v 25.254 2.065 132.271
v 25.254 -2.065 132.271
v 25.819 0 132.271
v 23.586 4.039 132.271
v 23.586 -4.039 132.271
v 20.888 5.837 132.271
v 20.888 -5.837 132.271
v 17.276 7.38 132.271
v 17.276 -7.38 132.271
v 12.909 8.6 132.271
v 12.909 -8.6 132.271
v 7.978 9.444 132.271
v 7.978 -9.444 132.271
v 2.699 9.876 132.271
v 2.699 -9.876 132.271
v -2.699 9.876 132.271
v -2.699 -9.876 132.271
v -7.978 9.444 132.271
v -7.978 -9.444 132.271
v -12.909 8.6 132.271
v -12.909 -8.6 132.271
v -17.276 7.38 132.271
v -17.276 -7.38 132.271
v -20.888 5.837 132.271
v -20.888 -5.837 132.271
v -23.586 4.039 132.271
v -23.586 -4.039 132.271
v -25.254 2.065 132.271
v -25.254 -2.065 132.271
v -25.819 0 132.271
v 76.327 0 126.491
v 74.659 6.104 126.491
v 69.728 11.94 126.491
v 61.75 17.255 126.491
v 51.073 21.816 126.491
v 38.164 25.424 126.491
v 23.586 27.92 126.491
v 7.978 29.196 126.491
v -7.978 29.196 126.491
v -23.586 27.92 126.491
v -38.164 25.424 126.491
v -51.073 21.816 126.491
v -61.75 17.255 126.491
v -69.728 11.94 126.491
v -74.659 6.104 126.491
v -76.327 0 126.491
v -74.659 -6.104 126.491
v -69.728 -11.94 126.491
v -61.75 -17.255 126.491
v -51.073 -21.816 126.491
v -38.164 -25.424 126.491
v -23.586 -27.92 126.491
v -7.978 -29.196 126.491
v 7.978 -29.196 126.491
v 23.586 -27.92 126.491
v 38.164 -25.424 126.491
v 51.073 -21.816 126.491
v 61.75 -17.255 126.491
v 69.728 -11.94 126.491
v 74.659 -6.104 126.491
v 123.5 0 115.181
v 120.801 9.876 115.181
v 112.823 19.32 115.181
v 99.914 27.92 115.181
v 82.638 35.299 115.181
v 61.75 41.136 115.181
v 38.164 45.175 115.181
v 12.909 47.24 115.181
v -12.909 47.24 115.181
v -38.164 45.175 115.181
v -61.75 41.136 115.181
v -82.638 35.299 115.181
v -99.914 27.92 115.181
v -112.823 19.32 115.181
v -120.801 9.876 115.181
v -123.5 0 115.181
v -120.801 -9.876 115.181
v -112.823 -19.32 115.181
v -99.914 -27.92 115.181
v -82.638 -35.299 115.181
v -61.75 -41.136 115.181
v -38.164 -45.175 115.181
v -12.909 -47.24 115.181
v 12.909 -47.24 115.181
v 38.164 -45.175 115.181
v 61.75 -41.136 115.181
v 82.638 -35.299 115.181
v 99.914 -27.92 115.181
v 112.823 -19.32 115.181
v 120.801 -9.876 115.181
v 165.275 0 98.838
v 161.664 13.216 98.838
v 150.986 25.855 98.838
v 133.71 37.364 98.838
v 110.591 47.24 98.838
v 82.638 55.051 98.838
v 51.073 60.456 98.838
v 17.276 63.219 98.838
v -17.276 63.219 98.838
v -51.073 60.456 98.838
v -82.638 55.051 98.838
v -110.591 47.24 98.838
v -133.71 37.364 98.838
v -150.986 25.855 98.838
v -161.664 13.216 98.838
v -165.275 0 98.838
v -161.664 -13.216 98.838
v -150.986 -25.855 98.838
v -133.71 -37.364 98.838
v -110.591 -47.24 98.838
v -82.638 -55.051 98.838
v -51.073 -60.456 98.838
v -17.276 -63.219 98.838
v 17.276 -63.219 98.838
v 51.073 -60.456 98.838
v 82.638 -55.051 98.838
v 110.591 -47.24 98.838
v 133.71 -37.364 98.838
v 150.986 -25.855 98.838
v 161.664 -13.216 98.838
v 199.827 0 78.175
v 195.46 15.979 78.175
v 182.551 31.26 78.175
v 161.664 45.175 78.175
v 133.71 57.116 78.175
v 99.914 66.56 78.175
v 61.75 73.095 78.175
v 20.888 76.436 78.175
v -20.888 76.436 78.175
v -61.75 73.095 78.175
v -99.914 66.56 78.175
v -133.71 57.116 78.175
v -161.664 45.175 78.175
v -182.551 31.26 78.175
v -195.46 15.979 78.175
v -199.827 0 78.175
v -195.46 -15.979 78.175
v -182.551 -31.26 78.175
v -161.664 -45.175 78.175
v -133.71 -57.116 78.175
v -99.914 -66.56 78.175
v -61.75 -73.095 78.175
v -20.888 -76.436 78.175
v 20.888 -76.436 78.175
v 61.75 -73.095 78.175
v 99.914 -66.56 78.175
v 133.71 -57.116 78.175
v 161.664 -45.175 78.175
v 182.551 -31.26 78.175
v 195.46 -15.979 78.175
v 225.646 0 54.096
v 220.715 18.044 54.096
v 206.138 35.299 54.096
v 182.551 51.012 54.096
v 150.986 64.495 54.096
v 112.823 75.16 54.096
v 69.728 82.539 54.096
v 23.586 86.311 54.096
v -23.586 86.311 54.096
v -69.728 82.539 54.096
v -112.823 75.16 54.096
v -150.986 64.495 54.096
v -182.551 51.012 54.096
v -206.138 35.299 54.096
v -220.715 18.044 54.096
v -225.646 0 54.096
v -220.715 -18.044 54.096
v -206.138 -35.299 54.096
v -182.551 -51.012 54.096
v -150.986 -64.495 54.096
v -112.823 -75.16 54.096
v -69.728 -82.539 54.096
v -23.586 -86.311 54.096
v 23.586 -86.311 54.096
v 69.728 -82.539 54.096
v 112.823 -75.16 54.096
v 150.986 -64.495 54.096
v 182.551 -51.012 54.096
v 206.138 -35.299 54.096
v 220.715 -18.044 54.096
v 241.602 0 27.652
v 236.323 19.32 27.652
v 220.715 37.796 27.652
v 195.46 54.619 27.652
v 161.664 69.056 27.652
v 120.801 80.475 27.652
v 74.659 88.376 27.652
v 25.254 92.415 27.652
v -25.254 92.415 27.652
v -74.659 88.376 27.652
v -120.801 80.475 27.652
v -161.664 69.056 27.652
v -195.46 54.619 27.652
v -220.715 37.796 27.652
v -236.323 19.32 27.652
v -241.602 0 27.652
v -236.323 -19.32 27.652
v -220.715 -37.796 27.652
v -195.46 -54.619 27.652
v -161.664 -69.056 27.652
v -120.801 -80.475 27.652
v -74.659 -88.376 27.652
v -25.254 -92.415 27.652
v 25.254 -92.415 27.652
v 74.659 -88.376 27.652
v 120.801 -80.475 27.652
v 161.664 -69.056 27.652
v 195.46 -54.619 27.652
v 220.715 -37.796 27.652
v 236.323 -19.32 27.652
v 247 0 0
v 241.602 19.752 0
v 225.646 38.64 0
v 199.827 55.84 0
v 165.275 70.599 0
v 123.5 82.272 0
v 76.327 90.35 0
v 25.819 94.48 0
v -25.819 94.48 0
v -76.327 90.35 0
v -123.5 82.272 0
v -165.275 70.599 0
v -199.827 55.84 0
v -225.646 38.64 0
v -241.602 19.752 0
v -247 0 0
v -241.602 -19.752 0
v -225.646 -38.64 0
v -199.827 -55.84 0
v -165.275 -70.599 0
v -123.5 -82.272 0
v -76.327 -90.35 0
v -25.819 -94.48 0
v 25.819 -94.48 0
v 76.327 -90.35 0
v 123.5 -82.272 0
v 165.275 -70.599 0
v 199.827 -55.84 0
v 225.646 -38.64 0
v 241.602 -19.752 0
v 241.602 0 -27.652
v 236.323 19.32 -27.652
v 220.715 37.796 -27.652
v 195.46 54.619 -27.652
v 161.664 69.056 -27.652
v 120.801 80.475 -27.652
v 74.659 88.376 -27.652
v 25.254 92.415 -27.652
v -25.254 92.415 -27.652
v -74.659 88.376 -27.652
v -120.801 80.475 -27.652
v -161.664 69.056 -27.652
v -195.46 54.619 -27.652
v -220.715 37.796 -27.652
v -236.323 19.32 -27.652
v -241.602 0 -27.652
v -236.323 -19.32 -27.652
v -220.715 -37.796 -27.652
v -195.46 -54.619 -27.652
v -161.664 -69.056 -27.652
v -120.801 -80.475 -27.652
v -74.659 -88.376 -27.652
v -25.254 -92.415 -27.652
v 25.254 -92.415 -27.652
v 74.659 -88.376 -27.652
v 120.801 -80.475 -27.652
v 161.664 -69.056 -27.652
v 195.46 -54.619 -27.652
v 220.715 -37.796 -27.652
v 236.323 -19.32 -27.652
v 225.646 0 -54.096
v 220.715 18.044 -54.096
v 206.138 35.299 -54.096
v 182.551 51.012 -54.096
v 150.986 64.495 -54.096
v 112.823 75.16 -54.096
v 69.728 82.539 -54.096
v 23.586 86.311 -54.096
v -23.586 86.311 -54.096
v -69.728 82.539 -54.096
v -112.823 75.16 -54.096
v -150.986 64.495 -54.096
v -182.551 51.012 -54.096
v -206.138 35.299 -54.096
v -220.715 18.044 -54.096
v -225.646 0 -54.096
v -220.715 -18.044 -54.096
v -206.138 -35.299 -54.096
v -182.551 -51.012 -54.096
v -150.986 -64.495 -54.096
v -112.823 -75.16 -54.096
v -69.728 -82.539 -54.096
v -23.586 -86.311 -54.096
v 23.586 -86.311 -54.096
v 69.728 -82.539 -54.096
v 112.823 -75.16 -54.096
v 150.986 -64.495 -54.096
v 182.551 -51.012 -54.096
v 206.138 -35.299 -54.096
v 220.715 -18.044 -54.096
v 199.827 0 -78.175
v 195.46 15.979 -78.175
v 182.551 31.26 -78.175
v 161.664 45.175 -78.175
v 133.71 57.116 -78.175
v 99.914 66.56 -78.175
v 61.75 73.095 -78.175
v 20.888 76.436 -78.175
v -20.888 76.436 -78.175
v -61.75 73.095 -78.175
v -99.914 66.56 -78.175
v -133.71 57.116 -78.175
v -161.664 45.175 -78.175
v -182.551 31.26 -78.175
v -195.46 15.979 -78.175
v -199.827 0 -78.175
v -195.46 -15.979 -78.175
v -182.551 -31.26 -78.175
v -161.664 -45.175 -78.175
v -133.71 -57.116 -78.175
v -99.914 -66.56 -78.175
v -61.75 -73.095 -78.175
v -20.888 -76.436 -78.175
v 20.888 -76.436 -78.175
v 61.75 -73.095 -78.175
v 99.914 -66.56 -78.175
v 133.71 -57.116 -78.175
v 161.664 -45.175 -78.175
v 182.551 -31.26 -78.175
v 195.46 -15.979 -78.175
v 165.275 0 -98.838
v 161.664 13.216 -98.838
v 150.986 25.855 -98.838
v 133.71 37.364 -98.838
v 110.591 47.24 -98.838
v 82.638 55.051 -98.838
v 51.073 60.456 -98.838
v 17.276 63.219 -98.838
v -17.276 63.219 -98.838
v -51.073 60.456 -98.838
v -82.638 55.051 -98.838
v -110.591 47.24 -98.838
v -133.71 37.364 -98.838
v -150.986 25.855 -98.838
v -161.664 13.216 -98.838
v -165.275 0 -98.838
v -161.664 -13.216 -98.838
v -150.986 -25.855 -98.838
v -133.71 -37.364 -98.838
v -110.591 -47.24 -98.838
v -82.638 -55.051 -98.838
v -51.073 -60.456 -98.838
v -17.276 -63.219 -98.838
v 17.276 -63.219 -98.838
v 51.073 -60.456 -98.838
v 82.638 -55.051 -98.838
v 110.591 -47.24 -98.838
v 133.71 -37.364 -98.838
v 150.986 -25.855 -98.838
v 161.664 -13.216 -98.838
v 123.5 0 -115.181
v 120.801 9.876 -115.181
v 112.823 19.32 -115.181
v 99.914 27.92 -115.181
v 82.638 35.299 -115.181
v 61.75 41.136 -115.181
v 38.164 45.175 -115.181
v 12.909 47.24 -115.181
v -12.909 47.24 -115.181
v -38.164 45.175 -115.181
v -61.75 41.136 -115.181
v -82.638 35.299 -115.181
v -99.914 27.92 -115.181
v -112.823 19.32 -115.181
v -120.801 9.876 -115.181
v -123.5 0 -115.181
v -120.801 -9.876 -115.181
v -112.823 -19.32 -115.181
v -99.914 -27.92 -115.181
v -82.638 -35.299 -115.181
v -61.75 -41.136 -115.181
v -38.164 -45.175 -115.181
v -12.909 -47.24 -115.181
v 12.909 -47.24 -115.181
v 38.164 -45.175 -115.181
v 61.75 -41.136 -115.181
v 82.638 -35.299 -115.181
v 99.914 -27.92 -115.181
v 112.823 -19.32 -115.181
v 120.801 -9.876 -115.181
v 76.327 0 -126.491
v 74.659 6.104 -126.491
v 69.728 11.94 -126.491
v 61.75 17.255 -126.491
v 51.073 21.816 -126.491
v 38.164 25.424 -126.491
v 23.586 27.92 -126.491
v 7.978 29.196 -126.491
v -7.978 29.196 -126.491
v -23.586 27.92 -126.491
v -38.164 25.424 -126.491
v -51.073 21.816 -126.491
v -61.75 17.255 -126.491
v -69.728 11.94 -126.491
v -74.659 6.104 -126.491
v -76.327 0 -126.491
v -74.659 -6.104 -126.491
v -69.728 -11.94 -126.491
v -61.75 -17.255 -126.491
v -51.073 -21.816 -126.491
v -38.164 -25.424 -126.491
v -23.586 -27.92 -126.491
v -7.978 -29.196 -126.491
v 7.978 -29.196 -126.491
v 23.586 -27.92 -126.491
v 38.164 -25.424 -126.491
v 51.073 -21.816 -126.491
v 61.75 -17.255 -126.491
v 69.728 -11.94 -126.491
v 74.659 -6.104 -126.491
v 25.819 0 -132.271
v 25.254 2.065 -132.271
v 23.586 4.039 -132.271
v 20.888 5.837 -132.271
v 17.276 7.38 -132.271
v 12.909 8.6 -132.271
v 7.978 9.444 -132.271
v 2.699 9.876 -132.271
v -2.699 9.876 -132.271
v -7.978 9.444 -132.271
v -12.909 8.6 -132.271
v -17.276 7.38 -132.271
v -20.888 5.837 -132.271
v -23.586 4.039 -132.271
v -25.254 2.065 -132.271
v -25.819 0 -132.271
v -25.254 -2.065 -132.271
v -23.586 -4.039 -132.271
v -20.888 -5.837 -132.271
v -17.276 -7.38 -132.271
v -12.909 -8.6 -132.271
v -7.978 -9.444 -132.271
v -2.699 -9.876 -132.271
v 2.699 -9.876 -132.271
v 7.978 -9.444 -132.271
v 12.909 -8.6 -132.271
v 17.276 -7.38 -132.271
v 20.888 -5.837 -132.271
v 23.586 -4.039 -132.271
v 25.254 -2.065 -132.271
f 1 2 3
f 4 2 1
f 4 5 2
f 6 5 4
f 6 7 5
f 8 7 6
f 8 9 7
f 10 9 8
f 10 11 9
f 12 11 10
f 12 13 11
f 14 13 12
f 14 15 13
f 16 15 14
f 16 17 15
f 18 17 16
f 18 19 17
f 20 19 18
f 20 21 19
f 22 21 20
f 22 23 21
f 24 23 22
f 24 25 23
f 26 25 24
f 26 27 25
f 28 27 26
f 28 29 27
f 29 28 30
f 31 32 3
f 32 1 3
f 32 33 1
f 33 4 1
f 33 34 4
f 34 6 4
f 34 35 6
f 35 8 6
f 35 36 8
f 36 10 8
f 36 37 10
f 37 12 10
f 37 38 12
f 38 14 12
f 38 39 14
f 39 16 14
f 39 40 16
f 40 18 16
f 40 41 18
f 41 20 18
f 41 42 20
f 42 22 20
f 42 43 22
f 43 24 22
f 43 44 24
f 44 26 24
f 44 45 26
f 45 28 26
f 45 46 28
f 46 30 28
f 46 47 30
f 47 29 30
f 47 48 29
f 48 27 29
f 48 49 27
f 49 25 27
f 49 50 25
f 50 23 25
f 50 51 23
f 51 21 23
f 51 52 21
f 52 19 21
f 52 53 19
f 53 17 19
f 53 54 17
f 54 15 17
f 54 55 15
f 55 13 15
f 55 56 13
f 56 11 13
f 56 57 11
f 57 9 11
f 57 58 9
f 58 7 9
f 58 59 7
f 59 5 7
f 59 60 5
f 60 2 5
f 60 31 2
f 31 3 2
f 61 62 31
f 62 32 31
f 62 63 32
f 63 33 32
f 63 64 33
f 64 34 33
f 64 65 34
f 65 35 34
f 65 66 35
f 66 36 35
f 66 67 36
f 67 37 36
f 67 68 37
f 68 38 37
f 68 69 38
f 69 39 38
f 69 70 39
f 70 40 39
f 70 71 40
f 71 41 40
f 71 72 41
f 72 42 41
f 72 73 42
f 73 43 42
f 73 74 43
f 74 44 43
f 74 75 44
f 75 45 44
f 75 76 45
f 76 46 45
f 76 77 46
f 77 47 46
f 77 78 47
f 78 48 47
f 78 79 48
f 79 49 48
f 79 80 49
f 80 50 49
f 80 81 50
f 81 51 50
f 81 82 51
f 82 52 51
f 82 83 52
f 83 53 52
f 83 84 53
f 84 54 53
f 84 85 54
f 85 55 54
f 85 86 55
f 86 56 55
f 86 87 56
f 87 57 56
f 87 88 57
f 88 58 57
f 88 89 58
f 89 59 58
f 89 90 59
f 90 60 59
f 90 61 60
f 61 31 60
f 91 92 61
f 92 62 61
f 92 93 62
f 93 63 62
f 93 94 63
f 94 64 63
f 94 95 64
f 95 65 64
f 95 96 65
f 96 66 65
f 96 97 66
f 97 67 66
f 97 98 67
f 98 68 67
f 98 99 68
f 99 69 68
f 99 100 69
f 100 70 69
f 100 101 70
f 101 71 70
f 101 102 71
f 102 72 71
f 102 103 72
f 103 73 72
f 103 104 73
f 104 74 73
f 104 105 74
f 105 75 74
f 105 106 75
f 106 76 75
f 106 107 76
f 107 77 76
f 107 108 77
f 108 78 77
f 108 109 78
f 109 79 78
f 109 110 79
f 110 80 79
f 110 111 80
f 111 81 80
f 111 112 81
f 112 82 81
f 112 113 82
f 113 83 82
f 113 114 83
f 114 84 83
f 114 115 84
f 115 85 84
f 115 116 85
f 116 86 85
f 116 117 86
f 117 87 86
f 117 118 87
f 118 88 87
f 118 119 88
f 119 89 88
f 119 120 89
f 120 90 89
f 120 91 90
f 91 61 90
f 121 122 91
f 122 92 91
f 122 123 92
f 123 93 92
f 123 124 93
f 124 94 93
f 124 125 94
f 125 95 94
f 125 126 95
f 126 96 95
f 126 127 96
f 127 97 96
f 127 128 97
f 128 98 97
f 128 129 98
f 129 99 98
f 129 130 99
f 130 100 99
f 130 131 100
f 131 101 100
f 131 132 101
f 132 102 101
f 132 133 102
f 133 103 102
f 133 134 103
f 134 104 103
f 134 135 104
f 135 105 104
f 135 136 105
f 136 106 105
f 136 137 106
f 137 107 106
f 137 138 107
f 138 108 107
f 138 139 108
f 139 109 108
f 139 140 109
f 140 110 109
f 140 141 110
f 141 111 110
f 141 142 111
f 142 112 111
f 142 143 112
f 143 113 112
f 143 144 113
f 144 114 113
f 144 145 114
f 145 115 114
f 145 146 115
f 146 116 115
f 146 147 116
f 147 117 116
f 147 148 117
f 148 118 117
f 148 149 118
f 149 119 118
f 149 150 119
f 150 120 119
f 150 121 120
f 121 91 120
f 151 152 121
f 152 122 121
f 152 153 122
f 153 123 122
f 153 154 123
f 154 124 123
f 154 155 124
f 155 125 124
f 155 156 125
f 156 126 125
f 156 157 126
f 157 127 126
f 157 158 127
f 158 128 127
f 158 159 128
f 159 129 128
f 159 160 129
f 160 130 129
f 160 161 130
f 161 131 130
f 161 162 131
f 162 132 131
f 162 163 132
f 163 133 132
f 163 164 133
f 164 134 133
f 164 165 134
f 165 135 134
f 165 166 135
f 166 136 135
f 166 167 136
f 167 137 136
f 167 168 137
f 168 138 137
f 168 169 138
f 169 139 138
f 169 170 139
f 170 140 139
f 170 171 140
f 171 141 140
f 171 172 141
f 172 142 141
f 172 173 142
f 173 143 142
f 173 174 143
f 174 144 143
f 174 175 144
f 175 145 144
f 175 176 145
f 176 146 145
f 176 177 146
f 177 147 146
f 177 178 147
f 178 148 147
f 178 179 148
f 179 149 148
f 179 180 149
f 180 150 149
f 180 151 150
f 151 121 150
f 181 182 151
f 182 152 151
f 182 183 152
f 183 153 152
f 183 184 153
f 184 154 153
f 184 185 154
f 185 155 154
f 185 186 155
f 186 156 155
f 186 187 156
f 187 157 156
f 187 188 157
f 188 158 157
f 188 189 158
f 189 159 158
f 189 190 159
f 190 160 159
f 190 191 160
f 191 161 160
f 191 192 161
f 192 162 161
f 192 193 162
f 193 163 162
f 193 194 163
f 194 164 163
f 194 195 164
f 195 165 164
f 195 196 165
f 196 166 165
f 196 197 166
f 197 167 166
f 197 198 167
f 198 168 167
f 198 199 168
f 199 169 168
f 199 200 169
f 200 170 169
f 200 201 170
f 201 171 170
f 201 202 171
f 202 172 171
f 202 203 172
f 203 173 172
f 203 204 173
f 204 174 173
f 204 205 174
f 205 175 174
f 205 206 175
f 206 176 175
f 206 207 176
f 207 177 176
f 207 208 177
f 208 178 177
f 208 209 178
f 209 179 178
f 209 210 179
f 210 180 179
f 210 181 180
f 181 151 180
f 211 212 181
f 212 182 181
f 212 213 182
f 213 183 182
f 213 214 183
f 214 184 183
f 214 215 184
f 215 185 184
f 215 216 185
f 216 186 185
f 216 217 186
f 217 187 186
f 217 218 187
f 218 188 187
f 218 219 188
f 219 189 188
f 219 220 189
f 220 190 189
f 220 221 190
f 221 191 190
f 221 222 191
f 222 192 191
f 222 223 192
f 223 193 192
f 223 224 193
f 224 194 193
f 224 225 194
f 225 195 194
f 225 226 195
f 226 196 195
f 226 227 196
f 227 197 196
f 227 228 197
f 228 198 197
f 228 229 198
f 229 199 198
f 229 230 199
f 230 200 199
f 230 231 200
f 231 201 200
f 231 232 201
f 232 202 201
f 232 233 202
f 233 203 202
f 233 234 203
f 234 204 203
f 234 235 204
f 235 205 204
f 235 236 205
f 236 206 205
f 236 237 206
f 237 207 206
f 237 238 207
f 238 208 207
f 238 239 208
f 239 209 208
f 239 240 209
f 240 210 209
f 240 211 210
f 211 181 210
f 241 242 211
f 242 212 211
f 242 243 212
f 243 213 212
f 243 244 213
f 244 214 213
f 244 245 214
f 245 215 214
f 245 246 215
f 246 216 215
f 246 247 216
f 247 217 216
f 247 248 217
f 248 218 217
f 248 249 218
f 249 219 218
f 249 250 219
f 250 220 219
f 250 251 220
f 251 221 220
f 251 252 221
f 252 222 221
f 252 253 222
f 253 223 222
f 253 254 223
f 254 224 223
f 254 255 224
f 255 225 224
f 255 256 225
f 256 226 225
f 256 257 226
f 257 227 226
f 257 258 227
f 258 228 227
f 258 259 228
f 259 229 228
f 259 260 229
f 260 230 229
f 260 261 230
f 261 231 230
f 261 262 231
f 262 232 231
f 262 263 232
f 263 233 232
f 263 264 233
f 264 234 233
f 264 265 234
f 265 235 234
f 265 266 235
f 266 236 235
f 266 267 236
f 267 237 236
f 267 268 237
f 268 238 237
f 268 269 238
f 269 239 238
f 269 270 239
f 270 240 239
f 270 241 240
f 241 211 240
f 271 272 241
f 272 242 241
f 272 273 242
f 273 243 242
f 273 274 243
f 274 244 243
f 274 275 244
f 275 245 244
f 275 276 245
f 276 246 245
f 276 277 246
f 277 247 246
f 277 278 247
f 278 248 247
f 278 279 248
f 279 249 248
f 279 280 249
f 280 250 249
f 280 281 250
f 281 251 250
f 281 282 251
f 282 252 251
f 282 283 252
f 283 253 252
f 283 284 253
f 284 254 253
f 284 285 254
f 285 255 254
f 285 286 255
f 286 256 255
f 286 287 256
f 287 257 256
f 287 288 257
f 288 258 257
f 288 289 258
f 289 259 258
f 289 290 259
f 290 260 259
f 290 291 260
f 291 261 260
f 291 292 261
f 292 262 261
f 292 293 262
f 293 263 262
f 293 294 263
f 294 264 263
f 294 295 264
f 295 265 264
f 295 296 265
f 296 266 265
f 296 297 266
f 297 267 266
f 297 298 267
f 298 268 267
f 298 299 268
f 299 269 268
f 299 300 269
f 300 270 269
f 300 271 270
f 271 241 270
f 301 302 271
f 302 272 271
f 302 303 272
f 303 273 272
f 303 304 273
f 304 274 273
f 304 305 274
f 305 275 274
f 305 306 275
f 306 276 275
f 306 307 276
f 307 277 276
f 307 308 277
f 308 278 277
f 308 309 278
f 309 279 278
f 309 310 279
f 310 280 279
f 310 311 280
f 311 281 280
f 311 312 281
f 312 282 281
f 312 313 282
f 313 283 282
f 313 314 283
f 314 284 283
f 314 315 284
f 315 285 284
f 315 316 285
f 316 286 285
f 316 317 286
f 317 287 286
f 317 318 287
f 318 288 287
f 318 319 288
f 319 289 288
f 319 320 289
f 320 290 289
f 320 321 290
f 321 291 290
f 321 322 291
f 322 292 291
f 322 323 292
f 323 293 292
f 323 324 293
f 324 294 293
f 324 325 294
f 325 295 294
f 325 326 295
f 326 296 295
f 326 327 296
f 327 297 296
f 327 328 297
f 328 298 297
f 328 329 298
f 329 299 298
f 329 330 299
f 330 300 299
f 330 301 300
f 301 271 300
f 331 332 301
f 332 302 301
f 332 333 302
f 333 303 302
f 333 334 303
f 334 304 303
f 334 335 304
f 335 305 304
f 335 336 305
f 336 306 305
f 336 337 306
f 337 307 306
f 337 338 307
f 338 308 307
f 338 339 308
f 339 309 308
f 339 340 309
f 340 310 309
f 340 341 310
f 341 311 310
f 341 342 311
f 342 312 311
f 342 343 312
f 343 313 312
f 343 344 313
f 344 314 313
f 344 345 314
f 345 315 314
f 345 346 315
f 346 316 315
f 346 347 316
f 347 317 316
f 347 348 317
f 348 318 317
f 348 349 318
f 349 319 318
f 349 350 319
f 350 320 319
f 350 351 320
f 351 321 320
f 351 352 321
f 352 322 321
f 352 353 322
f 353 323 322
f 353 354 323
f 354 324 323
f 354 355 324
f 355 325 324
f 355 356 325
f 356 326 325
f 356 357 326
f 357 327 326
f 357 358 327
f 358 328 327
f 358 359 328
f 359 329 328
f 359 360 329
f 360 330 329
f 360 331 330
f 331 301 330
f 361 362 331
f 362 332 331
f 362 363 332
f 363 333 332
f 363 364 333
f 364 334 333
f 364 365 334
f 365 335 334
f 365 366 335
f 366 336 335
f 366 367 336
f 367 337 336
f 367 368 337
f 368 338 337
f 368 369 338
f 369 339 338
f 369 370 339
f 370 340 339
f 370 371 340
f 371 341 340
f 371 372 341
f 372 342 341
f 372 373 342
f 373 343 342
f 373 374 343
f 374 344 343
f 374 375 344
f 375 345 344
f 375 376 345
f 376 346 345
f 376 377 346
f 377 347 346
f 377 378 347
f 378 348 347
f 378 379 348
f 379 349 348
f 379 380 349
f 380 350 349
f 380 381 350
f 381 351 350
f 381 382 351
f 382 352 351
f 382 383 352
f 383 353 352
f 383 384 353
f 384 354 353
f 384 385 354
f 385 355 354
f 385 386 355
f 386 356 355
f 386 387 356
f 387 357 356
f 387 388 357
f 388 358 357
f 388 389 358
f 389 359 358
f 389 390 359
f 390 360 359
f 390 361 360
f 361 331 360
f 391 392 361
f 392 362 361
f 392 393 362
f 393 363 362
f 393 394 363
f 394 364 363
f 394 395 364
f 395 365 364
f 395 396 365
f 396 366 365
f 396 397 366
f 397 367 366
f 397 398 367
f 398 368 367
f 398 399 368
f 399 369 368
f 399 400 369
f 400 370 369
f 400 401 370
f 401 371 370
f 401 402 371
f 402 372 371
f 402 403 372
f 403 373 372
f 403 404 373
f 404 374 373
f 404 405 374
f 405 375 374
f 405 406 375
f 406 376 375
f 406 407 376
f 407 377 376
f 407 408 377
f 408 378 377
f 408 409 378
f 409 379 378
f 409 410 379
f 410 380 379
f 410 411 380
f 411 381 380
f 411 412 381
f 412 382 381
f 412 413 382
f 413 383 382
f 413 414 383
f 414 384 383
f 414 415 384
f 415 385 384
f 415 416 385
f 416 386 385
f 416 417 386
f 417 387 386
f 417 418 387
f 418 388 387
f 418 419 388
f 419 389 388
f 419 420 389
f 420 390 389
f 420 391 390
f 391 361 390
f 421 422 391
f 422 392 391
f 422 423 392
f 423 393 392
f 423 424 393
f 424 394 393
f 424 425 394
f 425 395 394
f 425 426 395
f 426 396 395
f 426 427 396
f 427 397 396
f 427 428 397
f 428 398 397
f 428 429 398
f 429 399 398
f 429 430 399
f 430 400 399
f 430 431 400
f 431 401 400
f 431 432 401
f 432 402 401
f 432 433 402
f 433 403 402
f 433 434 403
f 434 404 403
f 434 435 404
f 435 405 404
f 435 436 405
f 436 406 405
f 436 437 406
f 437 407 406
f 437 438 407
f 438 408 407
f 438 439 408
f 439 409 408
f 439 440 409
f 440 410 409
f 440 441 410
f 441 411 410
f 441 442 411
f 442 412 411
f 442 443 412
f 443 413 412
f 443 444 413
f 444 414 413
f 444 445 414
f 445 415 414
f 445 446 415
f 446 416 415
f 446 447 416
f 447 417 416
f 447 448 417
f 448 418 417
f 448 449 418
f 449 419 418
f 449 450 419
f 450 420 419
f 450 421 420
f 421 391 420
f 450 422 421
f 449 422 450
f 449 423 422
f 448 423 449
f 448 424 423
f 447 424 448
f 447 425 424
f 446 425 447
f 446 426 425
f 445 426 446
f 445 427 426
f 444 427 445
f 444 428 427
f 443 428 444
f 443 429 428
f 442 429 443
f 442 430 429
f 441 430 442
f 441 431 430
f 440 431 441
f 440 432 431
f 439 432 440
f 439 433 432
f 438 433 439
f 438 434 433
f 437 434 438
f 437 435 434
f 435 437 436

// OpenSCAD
// Generated by SolidPython 1.0.1 on 2020-07-29 00:46:50


scale(v = [13, 5, 7]) {
	sphere(r = 19);
}
/***********************************************
*********      SolidPython code:      **********
************************************************
 
# import packages: SolidPython
from solid import *
from solid.utils import *
from itertools import chain, combinations, permutations


class Resize:

    def __init__(self, scad_file):
        self.scad_file = scad_file
        #self.scad_file = import_scad(scad_file)
        # cone/cylinder param:
        self.r1 = 0
        self.r2 = 0
        self.h = 0
        # rectangular prism param:
        self.w = 0
        self.l = 0
        # ellipse param:
        self.r = 0

    # import OpenScad code (file name corresponds to shape)


    # classify shape + parameters
    def assign(self, param1, param2, param3):
        if self.scad_file == 'cone.scad':
            self.r1 = param1
            self.r2 = param2
            self.h = param3
        elif self.scad_file == 'cylinder.scad':
            self.r1 = param1
            self.r2 = param2
            self.h = param3
        elif self.scad_file == 'rectangularPrism.scad':
            self.h = param1
            self.l = param2
            self.w = param3
        else:
            self.r = param1
            self.h = param2

    # resize parameters
    def iterate(self):
        x = range(3, 20, 2)
        i = 1
        if self.scad_file == 'cone.scad':
            tempList = list(permutations(x, 2))
            for temp in tempList:
                param1 = temp[0]
                param2 = temp[1]
                filepath = 'produced_scad_files/' + 'cone' + str(param1) + '_' + str(param2) + '_' + '.scad'
                scad_render_to_file(cylinder(h=param1, r1=param2, r2=0), filepath)

        elif self.scad_file == 'cylinder.scad':
            tempList = list(permutations(x, 3))
            for temp in tempList:
                param1 = temp[0]
                param2 = temp[1]
                filepath = 'produced_scad_files/' + 'cylinder' + str(param1) + '_' + str(param2) + '_' + '.scad'
                scad_render_to_file(cylinder(h=param1, r1=param2, r2=param2), filepath)

        elif self.scad_file == 'rectangularPrism.scad':
            tempList = list(permutations(x, 3))
            for temp in tempList:
                param1 = temp[0]
                param2 = temp[1]
                param3 = temp[2]
                filepath = 'produced_scad_files/' + 'rectangularPrism' + str(param1) + '_' + str(param2) + '_' + str(
                    param3) + '.scad'
                scad_render_to_file(cube(size=(param1, param2, param3)), filepath)

        elif self.scad_file == 'ellipse.scad':
            tempList = list(permutations(x, 4))
            for temp in tempList:
                param1 = temp[0]
                param2 = temp[1]
                param3 = temp[2]
                param4 = temp[3]
                filepath = 'produced_scad_files/' + 'ellipse' + str(param1) + '_' + str(param2) + '_' + str(param3) + '_' + str(param4) + '.scad'
                scad_render_to_file(scale([param1, param2, param3])(sphere(r=param4)), filepath)

    def render_to_scadfile(self):
        scad_render_to_file(scad, 'example.scad') 
 
************************************************/
